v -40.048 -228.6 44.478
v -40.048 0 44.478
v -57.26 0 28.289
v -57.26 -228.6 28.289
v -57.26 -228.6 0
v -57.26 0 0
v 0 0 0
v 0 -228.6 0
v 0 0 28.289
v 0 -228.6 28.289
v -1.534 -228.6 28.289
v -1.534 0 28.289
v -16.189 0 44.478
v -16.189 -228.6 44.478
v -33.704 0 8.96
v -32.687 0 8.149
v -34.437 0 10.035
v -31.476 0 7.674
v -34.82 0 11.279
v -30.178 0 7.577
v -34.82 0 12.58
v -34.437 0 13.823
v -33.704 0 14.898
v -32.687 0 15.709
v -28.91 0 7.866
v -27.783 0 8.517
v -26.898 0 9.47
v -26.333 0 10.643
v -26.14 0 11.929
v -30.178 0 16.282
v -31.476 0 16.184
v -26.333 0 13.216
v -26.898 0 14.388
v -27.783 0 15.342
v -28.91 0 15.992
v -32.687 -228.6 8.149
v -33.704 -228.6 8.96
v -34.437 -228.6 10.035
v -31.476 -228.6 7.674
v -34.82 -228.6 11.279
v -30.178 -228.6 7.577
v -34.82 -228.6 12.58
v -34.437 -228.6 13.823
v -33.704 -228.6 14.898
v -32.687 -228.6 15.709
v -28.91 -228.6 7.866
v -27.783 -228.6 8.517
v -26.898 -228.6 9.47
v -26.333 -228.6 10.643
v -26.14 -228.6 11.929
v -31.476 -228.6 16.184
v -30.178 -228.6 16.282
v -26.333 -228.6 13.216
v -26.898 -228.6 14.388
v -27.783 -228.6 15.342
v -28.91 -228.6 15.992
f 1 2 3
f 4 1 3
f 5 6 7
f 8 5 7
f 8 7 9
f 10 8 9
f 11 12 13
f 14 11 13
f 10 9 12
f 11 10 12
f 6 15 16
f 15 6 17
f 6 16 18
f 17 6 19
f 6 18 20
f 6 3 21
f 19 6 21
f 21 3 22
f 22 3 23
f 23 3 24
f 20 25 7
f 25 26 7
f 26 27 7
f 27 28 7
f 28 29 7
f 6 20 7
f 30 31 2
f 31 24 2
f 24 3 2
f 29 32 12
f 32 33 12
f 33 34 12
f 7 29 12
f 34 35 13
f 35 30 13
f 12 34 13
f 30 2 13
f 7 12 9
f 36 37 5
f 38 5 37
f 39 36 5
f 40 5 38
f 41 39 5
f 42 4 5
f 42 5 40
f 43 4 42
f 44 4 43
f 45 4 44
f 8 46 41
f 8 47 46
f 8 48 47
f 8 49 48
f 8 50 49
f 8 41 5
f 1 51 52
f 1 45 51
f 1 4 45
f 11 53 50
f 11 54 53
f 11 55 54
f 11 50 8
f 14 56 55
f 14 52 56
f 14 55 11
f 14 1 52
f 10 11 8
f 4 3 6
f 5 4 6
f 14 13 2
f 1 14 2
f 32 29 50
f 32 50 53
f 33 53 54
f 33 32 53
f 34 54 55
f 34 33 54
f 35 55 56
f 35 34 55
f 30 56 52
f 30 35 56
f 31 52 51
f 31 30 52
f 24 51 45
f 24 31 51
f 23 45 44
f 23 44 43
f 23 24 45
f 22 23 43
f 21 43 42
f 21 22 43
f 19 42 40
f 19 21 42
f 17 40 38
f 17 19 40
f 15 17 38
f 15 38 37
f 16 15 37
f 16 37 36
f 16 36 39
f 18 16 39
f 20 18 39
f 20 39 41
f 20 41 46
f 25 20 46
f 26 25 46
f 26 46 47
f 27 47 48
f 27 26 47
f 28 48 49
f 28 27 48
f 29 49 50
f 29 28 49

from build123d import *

# Parameters (mm, degrees)
F0_R     = 4.364763
F1_DEPTH = 228.6
F2_R     = 4.118273
F2_R_2   = 7.189832
F2_R_3   = 4.635799
F3_DEPTH = 25.4


with BuildPart() as f1:
    # F0 (on Front) → F1 (new body)
    with BuildSketch(Plane.XZ):
        Polygon((-57.259552, 0), (0, 0), (0, 28.288946), (-1.533737, 28.288946), (-57.259552, 28.288946), align=None)
        with Locations((-30.504346, 11.929073)):
            Circle(F0_R, mode=Mode.SUBTRACT)
        Polygon((-40.047605, 44.478402), (-57.259552, 28.288946), (-1.533737, 28.288946), (-16.189458, 44.478402), align=None)
    extrude(amount=F1_DEPTH)

    # F2 (on face) → F3 (join)
    with BuildSketch(Plane.XY.offset(44.478402)):
        with Locations((-31.015592, -27.802045)):
            Circle(F2_R)
        with Locations((-31.015592, -55.409327)):
            Circle(F2_R_2)
        with Locations((-28.970607, -90.514891)):
            Circle(F2_R_3)
    extrude(amount=-F3_DEPTH)


solid = f1.part
